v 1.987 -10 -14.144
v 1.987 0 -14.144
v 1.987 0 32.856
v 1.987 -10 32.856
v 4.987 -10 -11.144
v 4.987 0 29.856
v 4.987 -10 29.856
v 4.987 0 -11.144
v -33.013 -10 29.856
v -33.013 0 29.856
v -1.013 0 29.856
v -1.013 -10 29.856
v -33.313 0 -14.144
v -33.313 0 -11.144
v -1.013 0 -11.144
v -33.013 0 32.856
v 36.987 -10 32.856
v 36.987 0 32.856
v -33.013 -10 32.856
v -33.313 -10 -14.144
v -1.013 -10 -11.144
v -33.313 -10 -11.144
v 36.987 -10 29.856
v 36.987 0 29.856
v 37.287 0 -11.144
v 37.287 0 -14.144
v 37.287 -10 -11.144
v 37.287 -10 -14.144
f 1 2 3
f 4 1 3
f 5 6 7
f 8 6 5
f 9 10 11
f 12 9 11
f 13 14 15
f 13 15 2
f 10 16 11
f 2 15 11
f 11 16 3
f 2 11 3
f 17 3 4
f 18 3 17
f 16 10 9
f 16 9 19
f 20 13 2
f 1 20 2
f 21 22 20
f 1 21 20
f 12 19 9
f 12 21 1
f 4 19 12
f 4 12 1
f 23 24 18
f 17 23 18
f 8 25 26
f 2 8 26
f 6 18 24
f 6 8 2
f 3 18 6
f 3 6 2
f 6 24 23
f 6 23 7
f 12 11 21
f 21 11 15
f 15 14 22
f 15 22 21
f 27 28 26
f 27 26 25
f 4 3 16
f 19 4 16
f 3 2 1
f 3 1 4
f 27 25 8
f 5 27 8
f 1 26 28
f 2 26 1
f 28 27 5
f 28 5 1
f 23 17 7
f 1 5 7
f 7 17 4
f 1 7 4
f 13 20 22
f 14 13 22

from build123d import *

# Parameters (mm, degrees)
F0_W     = 32
F0_H     = 3
F0_W_2   = 3
F0_H_2   = 41
F0_W_3   = 32.299999
F1_DEPTH = 10


with BuildPart() as f1:
    # F0 (on Front) → F1 (new body)
    with BuildSketch(Plane.XZ):
        with Locations((-17.012699, 31.355872)):
            Rectangle(F0_W, F0_H)
        with Locations((0.487301, 31.355872)):
            Rectangle(F0_W_2, F0_H)
        with Locations((0.487301, 9.355872)):
            Rectangle(F0_W_2, F0_H_2)
        with Locations((0.487301, -12.644128)):
            Rectangle(F0_W_2, F0_H)
        with Locations((-17.162698, -12.644128)):
            Rectangle(F0_W_3, F0_H)
    extrude(amount=F1_DEPTH)


with BuildPart() as f2_1:
    # F2: instance of F1
    add(f1.part.mirror(Plane(origin=(1.987301, -5, 9.355872), x_dir=(0, 1, 0), z_dir=(1, 0, 0))))


solid = Compound([f1.part, f2_1.part])
